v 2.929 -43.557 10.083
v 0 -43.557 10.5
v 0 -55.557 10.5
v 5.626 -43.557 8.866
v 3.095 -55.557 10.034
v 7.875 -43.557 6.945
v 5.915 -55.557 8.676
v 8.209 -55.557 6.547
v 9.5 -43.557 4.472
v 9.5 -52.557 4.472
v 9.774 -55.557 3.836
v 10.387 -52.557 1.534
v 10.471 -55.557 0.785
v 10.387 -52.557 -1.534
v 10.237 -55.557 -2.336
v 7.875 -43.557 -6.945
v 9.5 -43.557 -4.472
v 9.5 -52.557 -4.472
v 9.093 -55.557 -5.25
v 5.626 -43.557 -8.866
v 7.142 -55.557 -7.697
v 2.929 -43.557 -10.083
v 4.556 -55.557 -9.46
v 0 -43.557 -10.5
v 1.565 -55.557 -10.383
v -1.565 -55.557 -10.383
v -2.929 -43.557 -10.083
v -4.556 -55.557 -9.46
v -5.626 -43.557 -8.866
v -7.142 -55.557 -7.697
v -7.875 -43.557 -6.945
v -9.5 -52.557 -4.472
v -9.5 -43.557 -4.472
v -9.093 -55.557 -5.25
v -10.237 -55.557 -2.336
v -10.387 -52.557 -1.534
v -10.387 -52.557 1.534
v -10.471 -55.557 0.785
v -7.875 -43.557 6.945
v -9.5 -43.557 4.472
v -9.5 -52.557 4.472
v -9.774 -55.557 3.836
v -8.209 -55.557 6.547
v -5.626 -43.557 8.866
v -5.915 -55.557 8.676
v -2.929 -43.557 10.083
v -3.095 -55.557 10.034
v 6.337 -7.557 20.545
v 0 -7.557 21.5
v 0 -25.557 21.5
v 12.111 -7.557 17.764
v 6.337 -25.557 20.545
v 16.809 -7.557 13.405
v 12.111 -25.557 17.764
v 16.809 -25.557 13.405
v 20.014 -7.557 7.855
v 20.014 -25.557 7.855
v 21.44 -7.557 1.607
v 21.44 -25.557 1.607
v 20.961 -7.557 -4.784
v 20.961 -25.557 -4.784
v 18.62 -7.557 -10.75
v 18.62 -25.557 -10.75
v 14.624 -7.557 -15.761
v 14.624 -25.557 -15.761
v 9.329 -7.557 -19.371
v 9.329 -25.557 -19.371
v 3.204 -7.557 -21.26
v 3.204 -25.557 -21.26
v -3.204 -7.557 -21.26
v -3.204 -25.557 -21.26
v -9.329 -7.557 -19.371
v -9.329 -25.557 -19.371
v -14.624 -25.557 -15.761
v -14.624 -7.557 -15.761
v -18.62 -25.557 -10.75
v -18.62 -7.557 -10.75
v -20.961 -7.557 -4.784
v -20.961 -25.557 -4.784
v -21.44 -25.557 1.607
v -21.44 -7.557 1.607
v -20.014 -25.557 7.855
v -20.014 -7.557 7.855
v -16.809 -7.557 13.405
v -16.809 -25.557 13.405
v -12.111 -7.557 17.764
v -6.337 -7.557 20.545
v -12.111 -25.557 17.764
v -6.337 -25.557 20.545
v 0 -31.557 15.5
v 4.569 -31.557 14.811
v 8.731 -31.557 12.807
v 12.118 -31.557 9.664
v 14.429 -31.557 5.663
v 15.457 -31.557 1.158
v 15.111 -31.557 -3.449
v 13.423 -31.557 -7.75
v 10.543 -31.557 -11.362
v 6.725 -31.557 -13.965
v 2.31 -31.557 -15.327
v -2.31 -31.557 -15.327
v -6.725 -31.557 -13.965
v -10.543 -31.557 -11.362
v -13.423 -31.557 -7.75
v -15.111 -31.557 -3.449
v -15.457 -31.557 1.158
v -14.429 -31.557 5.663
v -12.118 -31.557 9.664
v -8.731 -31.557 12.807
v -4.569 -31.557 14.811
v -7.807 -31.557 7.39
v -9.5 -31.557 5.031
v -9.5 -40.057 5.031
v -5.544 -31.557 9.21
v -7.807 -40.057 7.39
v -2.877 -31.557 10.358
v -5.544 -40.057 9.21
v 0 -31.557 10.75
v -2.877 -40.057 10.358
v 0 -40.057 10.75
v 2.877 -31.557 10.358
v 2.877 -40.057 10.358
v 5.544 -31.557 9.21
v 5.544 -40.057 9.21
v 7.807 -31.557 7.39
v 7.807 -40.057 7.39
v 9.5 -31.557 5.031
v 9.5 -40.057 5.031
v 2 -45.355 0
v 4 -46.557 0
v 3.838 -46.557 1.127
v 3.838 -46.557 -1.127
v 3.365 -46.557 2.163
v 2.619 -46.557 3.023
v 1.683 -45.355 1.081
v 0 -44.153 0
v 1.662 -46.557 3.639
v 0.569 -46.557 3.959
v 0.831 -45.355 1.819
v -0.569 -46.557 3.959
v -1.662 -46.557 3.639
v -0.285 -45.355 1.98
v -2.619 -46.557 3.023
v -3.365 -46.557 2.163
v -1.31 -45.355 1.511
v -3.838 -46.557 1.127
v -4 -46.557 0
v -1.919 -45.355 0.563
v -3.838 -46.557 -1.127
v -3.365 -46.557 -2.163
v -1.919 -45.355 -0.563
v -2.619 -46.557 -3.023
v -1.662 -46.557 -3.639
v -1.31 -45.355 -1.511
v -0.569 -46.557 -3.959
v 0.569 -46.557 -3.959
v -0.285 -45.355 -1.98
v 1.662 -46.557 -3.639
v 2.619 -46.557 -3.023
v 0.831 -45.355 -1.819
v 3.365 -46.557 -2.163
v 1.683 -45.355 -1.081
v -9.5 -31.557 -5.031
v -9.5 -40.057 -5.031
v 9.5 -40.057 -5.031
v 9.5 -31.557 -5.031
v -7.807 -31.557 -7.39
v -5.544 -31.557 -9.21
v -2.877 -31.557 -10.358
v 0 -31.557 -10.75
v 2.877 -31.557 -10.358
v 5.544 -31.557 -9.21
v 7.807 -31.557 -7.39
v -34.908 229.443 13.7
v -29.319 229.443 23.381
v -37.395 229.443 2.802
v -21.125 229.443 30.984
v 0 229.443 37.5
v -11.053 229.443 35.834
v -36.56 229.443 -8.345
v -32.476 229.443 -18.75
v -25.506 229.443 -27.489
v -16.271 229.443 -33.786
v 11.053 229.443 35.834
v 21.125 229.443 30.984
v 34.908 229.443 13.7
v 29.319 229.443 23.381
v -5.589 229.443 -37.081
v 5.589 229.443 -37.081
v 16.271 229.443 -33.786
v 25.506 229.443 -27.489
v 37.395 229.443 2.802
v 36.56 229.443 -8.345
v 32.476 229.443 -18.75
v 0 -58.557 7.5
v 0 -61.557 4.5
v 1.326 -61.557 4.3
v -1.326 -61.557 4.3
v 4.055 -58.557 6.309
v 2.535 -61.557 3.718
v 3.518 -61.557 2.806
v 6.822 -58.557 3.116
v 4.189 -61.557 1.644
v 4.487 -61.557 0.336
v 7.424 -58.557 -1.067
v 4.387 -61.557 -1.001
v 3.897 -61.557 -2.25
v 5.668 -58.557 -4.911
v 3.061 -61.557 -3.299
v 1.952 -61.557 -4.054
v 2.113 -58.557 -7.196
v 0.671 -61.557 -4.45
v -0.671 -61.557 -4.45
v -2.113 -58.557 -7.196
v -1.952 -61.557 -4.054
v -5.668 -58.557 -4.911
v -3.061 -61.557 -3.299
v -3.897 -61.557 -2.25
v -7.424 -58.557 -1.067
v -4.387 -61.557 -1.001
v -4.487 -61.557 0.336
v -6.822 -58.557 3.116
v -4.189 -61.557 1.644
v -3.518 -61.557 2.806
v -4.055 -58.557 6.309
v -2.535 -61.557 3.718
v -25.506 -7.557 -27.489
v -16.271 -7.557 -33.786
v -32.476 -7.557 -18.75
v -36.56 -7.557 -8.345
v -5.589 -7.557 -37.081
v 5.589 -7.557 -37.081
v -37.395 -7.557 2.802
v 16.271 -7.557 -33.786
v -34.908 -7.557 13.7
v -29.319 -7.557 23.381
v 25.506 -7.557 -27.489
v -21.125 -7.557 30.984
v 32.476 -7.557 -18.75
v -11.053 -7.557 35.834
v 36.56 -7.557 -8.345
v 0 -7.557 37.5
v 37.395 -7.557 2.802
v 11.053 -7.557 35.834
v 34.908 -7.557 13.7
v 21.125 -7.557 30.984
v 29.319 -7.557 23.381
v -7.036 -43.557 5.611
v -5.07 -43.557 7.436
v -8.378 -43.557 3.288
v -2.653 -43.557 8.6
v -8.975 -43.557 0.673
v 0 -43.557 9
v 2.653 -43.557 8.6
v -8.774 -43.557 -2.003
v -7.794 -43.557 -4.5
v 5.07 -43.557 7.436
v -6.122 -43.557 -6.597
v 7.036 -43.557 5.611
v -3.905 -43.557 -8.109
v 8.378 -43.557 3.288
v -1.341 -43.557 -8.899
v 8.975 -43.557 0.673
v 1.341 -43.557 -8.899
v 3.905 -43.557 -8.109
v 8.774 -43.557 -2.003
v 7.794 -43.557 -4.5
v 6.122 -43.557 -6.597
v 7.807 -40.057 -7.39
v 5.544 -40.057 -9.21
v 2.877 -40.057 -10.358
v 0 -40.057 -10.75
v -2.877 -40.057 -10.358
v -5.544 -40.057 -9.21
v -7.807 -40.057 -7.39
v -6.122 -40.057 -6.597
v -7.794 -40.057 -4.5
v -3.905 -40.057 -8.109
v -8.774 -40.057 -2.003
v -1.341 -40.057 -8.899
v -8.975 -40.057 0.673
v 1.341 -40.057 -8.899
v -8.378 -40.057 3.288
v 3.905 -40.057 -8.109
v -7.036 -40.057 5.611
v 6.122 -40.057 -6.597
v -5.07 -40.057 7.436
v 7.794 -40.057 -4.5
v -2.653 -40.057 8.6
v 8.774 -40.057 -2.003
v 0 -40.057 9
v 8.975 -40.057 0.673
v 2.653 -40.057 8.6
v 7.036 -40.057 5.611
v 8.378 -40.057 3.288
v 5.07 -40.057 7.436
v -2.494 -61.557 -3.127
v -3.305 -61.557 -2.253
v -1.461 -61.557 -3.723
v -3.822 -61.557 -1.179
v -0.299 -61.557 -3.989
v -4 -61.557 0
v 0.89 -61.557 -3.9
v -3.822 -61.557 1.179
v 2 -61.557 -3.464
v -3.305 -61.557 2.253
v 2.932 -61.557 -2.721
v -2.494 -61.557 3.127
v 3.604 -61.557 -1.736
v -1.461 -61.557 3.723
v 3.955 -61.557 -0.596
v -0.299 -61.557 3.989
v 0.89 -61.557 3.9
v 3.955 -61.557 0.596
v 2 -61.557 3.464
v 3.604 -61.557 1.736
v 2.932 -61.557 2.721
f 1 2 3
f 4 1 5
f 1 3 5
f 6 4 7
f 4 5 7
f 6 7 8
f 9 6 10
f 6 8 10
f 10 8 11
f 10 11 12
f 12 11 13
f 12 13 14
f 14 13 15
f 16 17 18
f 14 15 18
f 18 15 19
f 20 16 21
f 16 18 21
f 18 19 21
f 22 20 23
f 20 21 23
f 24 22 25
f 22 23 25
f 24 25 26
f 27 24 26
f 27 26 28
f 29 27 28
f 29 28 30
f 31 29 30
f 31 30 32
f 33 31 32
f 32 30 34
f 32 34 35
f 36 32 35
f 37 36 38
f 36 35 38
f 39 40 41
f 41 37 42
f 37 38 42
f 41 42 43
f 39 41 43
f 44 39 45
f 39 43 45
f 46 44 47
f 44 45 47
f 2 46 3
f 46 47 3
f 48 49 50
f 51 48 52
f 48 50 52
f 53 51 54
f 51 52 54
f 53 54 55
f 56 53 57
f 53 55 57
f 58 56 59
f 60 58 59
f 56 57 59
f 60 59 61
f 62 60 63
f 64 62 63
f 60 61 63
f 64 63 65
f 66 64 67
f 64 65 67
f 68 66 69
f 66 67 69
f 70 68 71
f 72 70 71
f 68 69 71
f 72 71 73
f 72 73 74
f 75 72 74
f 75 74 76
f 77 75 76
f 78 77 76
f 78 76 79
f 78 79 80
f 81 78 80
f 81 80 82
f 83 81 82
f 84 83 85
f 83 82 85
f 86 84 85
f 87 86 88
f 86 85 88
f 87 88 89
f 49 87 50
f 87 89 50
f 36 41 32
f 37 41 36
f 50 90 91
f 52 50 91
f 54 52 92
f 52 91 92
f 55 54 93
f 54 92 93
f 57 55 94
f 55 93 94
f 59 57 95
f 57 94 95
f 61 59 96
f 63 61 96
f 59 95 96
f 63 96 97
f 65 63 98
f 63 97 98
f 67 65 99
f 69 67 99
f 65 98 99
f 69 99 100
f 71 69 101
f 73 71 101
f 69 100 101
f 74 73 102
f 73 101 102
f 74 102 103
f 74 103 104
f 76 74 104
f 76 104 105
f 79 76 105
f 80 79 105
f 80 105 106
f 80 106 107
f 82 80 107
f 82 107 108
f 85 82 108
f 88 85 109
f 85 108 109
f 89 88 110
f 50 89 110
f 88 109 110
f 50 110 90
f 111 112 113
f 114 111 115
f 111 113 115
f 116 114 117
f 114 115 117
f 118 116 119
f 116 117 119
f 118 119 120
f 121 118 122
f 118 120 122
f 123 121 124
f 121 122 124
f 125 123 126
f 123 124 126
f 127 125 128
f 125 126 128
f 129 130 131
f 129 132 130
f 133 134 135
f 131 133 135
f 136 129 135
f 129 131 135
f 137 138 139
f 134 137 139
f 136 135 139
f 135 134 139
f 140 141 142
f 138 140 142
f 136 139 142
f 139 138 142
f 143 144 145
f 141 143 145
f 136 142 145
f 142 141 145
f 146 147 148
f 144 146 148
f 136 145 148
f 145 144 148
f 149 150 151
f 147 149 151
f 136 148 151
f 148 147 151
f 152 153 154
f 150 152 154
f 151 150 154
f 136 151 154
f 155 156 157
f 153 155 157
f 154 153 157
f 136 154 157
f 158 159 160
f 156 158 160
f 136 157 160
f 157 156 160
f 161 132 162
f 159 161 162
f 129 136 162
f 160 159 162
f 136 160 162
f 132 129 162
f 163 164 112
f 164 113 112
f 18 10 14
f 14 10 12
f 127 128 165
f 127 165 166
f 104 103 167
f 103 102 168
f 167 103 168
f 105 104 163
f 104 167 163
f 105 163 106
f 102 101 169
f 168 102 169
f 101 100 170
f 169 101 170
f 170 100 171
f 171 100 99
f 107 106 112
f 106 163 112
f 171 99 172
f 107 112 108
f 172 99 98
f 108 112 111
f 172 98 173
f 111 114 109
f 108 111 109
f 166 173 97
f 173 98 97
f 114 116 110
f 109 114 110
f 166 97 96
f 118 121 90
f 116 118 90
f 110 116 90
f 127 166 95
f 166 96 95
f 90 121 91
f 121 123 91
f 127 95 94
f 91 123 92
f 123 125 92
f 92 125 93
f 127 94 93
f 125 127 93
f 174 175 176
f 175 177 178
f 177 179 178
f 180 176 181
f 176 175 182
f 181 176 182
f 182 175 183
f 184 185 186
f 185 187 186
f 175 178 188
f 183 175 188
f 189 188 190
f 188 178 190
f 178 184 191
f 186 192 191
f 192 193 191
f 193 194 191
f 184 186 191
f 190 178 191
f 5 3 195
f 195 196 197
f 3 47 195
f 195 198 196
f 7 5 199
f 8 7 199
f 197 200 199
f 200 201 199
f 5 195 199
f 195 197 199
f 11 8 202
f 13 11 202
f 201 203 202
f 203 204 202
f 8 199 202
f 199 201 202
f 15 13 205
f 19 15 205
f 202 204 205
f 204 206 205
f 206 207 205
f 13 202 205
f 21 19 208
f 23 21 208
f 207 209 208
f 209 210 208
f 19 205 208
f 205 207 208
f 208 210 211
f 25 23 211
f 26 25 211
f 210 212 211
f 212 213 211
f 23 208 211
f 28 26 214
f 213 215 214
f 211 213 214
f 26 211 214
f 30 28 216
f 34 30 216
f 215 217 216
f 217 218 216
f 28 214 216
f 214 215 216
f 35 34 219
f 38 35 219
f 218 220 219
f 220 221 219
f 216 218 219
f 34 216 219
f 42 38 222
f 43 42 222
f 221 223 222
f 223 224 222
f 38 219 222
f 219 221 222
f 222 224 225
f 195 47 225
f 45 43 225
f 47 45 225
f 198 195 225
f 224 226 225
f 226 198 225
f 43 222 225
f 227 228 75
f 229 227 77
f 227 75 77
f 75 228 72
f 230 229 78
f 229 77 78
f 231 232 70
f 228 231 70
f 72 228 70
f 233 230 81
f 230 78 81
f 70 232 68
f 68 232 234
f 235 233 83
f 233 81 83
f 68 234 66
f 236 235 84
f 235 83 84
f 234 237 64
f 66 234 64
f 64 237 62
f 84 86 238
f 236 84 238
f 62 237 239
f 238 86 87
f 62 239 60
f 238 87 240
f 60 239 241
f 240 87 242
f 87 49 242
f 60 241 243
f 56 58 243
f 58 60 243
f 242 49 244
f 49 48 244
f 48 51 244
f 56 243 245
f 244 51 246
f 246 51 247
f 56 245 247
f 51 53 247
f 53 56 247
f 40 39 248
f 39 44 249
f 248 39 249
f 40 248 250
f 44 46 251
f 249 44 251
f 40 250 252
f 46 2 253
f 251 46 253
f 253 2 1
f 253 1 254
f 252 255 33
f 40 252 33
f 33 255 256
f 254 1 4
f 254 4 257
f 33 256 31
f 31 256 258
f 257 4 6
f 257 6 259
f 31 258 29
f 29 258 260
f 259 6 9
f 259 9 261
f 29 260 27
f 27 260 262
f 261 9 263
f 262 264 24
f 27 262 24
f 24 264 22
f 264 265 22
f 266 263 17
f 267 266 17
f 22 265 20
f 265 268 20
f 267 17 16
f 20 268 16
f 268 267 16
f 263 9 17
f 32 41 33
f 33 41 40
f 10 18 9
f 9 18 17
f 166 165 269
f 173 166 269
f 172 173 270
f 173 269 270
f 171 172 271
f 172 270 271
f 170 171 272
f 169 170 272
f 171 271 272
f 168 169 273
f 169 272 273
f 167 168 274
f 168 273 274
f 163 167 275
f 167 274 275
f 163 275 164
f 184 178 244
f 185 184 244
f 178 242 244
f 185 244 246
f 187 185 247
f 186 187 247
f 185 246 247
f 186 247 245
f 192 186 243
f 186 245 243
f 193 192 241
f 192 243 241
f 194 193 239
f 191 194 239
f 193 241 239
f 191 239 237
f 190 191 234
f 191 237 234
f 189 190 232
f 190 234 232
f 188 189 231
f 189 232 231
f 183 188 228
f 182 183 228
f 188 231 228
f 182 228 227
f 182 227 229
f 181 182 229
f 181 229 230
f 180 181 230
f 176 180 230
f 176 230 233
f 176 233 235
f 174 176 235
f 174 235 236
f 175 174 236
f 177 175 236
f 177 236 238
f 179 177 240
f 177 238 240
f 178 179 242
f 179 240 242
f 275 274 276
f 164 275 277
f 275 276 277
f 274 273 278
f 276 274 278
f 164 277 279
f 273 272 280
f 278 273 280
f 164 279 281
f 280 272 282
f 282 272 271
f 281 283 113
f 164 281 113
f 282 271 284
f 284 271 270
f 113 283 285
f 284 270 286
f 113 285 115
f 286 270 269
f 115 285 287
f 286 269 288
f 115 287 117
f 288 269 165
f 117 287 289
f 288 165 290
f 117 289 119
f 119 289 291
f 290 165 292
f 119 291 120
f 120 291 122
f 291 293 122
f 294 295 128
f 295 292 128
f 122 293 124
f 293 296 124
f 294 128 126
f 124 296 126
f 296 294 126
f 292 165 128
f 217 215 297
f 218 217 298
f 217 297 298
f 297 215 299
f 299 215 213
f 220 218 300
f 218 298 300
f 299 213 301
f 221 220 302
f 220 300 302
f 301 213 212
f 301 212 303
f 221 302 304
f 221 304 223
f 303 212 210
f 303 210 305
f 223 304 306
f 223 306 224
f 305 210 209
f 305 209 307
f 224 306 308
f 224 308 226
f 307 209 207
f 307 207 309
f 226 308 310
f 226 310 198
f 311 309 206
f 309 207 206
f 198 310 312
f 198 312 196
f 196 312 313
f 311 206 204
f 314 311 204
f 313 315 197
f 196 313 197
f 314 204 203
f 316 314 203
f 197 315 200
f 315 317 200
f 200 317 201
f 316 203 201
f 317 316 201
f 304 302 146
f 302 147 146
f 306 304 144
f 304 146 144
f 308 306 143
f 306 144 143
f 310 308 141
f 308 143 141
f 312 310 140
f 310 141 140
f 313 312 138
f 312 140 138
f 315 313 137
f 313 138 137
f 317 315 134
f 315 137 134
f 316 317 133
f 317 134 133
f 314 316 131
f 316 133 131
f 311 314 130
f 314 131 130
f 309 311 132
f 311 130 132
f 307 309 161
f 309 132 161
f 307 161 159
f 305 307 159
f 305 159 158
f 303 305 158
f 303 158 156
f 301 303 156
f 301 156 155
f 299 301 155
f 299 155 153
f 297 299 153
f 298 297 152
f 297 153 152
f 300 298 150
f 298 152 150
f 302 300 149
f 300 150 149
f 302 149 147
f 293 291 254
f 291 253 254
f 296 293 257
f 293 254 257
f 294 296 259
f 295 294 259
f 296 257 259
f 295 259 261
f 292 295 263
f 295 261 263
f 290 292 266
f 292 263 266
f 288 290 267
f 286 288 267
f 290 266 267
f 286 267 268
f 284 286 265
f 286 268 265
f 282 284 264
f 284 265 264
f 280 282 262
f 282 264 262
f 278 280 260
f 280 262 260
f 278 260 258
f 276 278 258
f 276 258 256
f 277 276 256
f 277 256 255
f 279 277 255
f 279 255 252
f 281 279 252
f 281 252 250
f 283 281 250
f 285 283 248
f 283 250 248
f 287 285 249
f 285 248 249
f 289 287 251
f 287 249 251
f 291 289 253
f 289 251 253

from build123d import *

# Parameters (mm, degrees)
F3_D     = 8
F3_DEPTH = 15
F3_TIP   = 2.4034424761
F4_W     = 3
F4_H     = 21
F5_DEPTH = 12.5


with BuildPart() as f1:
    # F0 (on Right) → F1 (revolve)
    with BuildSketch(Plane.YZ):
        Polygon((-61.5567314936, 4.5), (-61.5567314936, 0), (229.4432685064, 0), (229.4432685064, 37.5), (-7.5567314936, 37.5), (-7.5567314936, 21.5), (-25.5567314936, 21.5), (-31.5567314936, 15.5), (-31.5567314936, 10.75), (-40.0567314936, 10.75), (-40.0567314936, 9), (-43.5567314936, 9), (-43.5567314936, 10.5), (-55.5567314936, 10.5), align=None)
    revolve(axis=Axis((0, 83.9432685064, 0), (0, 1, 0)))

    # F3
    with Locations(Plane.XZ.offset(61.5567314936)):
        with Locations((0, 0)):
            Hole(F3_D / 2, depth=F3_DEPTH)
            with Locations((0, 0, -(F3_DEPTH + F3_TIP / 2))):  # 118° drill point
                Cone(0, F3_D / 2, F3_TIP, mode=Mode.SUBTRACT)

    # F4 (on Top) → F5 (cut, symmetric)
    with BuildSketch(Plane.XY):
        with Locations((11, -42.0567314936)):
            Rectangle(F4_W, F4_H)
        with Locations((-11, -42.0567314936)):
            Rectangle(F4_W, F4_H)
    extrude(amount=F5_DEPTH, both=True, mode=Mode.SUBTRACT)


solid = f1.part
